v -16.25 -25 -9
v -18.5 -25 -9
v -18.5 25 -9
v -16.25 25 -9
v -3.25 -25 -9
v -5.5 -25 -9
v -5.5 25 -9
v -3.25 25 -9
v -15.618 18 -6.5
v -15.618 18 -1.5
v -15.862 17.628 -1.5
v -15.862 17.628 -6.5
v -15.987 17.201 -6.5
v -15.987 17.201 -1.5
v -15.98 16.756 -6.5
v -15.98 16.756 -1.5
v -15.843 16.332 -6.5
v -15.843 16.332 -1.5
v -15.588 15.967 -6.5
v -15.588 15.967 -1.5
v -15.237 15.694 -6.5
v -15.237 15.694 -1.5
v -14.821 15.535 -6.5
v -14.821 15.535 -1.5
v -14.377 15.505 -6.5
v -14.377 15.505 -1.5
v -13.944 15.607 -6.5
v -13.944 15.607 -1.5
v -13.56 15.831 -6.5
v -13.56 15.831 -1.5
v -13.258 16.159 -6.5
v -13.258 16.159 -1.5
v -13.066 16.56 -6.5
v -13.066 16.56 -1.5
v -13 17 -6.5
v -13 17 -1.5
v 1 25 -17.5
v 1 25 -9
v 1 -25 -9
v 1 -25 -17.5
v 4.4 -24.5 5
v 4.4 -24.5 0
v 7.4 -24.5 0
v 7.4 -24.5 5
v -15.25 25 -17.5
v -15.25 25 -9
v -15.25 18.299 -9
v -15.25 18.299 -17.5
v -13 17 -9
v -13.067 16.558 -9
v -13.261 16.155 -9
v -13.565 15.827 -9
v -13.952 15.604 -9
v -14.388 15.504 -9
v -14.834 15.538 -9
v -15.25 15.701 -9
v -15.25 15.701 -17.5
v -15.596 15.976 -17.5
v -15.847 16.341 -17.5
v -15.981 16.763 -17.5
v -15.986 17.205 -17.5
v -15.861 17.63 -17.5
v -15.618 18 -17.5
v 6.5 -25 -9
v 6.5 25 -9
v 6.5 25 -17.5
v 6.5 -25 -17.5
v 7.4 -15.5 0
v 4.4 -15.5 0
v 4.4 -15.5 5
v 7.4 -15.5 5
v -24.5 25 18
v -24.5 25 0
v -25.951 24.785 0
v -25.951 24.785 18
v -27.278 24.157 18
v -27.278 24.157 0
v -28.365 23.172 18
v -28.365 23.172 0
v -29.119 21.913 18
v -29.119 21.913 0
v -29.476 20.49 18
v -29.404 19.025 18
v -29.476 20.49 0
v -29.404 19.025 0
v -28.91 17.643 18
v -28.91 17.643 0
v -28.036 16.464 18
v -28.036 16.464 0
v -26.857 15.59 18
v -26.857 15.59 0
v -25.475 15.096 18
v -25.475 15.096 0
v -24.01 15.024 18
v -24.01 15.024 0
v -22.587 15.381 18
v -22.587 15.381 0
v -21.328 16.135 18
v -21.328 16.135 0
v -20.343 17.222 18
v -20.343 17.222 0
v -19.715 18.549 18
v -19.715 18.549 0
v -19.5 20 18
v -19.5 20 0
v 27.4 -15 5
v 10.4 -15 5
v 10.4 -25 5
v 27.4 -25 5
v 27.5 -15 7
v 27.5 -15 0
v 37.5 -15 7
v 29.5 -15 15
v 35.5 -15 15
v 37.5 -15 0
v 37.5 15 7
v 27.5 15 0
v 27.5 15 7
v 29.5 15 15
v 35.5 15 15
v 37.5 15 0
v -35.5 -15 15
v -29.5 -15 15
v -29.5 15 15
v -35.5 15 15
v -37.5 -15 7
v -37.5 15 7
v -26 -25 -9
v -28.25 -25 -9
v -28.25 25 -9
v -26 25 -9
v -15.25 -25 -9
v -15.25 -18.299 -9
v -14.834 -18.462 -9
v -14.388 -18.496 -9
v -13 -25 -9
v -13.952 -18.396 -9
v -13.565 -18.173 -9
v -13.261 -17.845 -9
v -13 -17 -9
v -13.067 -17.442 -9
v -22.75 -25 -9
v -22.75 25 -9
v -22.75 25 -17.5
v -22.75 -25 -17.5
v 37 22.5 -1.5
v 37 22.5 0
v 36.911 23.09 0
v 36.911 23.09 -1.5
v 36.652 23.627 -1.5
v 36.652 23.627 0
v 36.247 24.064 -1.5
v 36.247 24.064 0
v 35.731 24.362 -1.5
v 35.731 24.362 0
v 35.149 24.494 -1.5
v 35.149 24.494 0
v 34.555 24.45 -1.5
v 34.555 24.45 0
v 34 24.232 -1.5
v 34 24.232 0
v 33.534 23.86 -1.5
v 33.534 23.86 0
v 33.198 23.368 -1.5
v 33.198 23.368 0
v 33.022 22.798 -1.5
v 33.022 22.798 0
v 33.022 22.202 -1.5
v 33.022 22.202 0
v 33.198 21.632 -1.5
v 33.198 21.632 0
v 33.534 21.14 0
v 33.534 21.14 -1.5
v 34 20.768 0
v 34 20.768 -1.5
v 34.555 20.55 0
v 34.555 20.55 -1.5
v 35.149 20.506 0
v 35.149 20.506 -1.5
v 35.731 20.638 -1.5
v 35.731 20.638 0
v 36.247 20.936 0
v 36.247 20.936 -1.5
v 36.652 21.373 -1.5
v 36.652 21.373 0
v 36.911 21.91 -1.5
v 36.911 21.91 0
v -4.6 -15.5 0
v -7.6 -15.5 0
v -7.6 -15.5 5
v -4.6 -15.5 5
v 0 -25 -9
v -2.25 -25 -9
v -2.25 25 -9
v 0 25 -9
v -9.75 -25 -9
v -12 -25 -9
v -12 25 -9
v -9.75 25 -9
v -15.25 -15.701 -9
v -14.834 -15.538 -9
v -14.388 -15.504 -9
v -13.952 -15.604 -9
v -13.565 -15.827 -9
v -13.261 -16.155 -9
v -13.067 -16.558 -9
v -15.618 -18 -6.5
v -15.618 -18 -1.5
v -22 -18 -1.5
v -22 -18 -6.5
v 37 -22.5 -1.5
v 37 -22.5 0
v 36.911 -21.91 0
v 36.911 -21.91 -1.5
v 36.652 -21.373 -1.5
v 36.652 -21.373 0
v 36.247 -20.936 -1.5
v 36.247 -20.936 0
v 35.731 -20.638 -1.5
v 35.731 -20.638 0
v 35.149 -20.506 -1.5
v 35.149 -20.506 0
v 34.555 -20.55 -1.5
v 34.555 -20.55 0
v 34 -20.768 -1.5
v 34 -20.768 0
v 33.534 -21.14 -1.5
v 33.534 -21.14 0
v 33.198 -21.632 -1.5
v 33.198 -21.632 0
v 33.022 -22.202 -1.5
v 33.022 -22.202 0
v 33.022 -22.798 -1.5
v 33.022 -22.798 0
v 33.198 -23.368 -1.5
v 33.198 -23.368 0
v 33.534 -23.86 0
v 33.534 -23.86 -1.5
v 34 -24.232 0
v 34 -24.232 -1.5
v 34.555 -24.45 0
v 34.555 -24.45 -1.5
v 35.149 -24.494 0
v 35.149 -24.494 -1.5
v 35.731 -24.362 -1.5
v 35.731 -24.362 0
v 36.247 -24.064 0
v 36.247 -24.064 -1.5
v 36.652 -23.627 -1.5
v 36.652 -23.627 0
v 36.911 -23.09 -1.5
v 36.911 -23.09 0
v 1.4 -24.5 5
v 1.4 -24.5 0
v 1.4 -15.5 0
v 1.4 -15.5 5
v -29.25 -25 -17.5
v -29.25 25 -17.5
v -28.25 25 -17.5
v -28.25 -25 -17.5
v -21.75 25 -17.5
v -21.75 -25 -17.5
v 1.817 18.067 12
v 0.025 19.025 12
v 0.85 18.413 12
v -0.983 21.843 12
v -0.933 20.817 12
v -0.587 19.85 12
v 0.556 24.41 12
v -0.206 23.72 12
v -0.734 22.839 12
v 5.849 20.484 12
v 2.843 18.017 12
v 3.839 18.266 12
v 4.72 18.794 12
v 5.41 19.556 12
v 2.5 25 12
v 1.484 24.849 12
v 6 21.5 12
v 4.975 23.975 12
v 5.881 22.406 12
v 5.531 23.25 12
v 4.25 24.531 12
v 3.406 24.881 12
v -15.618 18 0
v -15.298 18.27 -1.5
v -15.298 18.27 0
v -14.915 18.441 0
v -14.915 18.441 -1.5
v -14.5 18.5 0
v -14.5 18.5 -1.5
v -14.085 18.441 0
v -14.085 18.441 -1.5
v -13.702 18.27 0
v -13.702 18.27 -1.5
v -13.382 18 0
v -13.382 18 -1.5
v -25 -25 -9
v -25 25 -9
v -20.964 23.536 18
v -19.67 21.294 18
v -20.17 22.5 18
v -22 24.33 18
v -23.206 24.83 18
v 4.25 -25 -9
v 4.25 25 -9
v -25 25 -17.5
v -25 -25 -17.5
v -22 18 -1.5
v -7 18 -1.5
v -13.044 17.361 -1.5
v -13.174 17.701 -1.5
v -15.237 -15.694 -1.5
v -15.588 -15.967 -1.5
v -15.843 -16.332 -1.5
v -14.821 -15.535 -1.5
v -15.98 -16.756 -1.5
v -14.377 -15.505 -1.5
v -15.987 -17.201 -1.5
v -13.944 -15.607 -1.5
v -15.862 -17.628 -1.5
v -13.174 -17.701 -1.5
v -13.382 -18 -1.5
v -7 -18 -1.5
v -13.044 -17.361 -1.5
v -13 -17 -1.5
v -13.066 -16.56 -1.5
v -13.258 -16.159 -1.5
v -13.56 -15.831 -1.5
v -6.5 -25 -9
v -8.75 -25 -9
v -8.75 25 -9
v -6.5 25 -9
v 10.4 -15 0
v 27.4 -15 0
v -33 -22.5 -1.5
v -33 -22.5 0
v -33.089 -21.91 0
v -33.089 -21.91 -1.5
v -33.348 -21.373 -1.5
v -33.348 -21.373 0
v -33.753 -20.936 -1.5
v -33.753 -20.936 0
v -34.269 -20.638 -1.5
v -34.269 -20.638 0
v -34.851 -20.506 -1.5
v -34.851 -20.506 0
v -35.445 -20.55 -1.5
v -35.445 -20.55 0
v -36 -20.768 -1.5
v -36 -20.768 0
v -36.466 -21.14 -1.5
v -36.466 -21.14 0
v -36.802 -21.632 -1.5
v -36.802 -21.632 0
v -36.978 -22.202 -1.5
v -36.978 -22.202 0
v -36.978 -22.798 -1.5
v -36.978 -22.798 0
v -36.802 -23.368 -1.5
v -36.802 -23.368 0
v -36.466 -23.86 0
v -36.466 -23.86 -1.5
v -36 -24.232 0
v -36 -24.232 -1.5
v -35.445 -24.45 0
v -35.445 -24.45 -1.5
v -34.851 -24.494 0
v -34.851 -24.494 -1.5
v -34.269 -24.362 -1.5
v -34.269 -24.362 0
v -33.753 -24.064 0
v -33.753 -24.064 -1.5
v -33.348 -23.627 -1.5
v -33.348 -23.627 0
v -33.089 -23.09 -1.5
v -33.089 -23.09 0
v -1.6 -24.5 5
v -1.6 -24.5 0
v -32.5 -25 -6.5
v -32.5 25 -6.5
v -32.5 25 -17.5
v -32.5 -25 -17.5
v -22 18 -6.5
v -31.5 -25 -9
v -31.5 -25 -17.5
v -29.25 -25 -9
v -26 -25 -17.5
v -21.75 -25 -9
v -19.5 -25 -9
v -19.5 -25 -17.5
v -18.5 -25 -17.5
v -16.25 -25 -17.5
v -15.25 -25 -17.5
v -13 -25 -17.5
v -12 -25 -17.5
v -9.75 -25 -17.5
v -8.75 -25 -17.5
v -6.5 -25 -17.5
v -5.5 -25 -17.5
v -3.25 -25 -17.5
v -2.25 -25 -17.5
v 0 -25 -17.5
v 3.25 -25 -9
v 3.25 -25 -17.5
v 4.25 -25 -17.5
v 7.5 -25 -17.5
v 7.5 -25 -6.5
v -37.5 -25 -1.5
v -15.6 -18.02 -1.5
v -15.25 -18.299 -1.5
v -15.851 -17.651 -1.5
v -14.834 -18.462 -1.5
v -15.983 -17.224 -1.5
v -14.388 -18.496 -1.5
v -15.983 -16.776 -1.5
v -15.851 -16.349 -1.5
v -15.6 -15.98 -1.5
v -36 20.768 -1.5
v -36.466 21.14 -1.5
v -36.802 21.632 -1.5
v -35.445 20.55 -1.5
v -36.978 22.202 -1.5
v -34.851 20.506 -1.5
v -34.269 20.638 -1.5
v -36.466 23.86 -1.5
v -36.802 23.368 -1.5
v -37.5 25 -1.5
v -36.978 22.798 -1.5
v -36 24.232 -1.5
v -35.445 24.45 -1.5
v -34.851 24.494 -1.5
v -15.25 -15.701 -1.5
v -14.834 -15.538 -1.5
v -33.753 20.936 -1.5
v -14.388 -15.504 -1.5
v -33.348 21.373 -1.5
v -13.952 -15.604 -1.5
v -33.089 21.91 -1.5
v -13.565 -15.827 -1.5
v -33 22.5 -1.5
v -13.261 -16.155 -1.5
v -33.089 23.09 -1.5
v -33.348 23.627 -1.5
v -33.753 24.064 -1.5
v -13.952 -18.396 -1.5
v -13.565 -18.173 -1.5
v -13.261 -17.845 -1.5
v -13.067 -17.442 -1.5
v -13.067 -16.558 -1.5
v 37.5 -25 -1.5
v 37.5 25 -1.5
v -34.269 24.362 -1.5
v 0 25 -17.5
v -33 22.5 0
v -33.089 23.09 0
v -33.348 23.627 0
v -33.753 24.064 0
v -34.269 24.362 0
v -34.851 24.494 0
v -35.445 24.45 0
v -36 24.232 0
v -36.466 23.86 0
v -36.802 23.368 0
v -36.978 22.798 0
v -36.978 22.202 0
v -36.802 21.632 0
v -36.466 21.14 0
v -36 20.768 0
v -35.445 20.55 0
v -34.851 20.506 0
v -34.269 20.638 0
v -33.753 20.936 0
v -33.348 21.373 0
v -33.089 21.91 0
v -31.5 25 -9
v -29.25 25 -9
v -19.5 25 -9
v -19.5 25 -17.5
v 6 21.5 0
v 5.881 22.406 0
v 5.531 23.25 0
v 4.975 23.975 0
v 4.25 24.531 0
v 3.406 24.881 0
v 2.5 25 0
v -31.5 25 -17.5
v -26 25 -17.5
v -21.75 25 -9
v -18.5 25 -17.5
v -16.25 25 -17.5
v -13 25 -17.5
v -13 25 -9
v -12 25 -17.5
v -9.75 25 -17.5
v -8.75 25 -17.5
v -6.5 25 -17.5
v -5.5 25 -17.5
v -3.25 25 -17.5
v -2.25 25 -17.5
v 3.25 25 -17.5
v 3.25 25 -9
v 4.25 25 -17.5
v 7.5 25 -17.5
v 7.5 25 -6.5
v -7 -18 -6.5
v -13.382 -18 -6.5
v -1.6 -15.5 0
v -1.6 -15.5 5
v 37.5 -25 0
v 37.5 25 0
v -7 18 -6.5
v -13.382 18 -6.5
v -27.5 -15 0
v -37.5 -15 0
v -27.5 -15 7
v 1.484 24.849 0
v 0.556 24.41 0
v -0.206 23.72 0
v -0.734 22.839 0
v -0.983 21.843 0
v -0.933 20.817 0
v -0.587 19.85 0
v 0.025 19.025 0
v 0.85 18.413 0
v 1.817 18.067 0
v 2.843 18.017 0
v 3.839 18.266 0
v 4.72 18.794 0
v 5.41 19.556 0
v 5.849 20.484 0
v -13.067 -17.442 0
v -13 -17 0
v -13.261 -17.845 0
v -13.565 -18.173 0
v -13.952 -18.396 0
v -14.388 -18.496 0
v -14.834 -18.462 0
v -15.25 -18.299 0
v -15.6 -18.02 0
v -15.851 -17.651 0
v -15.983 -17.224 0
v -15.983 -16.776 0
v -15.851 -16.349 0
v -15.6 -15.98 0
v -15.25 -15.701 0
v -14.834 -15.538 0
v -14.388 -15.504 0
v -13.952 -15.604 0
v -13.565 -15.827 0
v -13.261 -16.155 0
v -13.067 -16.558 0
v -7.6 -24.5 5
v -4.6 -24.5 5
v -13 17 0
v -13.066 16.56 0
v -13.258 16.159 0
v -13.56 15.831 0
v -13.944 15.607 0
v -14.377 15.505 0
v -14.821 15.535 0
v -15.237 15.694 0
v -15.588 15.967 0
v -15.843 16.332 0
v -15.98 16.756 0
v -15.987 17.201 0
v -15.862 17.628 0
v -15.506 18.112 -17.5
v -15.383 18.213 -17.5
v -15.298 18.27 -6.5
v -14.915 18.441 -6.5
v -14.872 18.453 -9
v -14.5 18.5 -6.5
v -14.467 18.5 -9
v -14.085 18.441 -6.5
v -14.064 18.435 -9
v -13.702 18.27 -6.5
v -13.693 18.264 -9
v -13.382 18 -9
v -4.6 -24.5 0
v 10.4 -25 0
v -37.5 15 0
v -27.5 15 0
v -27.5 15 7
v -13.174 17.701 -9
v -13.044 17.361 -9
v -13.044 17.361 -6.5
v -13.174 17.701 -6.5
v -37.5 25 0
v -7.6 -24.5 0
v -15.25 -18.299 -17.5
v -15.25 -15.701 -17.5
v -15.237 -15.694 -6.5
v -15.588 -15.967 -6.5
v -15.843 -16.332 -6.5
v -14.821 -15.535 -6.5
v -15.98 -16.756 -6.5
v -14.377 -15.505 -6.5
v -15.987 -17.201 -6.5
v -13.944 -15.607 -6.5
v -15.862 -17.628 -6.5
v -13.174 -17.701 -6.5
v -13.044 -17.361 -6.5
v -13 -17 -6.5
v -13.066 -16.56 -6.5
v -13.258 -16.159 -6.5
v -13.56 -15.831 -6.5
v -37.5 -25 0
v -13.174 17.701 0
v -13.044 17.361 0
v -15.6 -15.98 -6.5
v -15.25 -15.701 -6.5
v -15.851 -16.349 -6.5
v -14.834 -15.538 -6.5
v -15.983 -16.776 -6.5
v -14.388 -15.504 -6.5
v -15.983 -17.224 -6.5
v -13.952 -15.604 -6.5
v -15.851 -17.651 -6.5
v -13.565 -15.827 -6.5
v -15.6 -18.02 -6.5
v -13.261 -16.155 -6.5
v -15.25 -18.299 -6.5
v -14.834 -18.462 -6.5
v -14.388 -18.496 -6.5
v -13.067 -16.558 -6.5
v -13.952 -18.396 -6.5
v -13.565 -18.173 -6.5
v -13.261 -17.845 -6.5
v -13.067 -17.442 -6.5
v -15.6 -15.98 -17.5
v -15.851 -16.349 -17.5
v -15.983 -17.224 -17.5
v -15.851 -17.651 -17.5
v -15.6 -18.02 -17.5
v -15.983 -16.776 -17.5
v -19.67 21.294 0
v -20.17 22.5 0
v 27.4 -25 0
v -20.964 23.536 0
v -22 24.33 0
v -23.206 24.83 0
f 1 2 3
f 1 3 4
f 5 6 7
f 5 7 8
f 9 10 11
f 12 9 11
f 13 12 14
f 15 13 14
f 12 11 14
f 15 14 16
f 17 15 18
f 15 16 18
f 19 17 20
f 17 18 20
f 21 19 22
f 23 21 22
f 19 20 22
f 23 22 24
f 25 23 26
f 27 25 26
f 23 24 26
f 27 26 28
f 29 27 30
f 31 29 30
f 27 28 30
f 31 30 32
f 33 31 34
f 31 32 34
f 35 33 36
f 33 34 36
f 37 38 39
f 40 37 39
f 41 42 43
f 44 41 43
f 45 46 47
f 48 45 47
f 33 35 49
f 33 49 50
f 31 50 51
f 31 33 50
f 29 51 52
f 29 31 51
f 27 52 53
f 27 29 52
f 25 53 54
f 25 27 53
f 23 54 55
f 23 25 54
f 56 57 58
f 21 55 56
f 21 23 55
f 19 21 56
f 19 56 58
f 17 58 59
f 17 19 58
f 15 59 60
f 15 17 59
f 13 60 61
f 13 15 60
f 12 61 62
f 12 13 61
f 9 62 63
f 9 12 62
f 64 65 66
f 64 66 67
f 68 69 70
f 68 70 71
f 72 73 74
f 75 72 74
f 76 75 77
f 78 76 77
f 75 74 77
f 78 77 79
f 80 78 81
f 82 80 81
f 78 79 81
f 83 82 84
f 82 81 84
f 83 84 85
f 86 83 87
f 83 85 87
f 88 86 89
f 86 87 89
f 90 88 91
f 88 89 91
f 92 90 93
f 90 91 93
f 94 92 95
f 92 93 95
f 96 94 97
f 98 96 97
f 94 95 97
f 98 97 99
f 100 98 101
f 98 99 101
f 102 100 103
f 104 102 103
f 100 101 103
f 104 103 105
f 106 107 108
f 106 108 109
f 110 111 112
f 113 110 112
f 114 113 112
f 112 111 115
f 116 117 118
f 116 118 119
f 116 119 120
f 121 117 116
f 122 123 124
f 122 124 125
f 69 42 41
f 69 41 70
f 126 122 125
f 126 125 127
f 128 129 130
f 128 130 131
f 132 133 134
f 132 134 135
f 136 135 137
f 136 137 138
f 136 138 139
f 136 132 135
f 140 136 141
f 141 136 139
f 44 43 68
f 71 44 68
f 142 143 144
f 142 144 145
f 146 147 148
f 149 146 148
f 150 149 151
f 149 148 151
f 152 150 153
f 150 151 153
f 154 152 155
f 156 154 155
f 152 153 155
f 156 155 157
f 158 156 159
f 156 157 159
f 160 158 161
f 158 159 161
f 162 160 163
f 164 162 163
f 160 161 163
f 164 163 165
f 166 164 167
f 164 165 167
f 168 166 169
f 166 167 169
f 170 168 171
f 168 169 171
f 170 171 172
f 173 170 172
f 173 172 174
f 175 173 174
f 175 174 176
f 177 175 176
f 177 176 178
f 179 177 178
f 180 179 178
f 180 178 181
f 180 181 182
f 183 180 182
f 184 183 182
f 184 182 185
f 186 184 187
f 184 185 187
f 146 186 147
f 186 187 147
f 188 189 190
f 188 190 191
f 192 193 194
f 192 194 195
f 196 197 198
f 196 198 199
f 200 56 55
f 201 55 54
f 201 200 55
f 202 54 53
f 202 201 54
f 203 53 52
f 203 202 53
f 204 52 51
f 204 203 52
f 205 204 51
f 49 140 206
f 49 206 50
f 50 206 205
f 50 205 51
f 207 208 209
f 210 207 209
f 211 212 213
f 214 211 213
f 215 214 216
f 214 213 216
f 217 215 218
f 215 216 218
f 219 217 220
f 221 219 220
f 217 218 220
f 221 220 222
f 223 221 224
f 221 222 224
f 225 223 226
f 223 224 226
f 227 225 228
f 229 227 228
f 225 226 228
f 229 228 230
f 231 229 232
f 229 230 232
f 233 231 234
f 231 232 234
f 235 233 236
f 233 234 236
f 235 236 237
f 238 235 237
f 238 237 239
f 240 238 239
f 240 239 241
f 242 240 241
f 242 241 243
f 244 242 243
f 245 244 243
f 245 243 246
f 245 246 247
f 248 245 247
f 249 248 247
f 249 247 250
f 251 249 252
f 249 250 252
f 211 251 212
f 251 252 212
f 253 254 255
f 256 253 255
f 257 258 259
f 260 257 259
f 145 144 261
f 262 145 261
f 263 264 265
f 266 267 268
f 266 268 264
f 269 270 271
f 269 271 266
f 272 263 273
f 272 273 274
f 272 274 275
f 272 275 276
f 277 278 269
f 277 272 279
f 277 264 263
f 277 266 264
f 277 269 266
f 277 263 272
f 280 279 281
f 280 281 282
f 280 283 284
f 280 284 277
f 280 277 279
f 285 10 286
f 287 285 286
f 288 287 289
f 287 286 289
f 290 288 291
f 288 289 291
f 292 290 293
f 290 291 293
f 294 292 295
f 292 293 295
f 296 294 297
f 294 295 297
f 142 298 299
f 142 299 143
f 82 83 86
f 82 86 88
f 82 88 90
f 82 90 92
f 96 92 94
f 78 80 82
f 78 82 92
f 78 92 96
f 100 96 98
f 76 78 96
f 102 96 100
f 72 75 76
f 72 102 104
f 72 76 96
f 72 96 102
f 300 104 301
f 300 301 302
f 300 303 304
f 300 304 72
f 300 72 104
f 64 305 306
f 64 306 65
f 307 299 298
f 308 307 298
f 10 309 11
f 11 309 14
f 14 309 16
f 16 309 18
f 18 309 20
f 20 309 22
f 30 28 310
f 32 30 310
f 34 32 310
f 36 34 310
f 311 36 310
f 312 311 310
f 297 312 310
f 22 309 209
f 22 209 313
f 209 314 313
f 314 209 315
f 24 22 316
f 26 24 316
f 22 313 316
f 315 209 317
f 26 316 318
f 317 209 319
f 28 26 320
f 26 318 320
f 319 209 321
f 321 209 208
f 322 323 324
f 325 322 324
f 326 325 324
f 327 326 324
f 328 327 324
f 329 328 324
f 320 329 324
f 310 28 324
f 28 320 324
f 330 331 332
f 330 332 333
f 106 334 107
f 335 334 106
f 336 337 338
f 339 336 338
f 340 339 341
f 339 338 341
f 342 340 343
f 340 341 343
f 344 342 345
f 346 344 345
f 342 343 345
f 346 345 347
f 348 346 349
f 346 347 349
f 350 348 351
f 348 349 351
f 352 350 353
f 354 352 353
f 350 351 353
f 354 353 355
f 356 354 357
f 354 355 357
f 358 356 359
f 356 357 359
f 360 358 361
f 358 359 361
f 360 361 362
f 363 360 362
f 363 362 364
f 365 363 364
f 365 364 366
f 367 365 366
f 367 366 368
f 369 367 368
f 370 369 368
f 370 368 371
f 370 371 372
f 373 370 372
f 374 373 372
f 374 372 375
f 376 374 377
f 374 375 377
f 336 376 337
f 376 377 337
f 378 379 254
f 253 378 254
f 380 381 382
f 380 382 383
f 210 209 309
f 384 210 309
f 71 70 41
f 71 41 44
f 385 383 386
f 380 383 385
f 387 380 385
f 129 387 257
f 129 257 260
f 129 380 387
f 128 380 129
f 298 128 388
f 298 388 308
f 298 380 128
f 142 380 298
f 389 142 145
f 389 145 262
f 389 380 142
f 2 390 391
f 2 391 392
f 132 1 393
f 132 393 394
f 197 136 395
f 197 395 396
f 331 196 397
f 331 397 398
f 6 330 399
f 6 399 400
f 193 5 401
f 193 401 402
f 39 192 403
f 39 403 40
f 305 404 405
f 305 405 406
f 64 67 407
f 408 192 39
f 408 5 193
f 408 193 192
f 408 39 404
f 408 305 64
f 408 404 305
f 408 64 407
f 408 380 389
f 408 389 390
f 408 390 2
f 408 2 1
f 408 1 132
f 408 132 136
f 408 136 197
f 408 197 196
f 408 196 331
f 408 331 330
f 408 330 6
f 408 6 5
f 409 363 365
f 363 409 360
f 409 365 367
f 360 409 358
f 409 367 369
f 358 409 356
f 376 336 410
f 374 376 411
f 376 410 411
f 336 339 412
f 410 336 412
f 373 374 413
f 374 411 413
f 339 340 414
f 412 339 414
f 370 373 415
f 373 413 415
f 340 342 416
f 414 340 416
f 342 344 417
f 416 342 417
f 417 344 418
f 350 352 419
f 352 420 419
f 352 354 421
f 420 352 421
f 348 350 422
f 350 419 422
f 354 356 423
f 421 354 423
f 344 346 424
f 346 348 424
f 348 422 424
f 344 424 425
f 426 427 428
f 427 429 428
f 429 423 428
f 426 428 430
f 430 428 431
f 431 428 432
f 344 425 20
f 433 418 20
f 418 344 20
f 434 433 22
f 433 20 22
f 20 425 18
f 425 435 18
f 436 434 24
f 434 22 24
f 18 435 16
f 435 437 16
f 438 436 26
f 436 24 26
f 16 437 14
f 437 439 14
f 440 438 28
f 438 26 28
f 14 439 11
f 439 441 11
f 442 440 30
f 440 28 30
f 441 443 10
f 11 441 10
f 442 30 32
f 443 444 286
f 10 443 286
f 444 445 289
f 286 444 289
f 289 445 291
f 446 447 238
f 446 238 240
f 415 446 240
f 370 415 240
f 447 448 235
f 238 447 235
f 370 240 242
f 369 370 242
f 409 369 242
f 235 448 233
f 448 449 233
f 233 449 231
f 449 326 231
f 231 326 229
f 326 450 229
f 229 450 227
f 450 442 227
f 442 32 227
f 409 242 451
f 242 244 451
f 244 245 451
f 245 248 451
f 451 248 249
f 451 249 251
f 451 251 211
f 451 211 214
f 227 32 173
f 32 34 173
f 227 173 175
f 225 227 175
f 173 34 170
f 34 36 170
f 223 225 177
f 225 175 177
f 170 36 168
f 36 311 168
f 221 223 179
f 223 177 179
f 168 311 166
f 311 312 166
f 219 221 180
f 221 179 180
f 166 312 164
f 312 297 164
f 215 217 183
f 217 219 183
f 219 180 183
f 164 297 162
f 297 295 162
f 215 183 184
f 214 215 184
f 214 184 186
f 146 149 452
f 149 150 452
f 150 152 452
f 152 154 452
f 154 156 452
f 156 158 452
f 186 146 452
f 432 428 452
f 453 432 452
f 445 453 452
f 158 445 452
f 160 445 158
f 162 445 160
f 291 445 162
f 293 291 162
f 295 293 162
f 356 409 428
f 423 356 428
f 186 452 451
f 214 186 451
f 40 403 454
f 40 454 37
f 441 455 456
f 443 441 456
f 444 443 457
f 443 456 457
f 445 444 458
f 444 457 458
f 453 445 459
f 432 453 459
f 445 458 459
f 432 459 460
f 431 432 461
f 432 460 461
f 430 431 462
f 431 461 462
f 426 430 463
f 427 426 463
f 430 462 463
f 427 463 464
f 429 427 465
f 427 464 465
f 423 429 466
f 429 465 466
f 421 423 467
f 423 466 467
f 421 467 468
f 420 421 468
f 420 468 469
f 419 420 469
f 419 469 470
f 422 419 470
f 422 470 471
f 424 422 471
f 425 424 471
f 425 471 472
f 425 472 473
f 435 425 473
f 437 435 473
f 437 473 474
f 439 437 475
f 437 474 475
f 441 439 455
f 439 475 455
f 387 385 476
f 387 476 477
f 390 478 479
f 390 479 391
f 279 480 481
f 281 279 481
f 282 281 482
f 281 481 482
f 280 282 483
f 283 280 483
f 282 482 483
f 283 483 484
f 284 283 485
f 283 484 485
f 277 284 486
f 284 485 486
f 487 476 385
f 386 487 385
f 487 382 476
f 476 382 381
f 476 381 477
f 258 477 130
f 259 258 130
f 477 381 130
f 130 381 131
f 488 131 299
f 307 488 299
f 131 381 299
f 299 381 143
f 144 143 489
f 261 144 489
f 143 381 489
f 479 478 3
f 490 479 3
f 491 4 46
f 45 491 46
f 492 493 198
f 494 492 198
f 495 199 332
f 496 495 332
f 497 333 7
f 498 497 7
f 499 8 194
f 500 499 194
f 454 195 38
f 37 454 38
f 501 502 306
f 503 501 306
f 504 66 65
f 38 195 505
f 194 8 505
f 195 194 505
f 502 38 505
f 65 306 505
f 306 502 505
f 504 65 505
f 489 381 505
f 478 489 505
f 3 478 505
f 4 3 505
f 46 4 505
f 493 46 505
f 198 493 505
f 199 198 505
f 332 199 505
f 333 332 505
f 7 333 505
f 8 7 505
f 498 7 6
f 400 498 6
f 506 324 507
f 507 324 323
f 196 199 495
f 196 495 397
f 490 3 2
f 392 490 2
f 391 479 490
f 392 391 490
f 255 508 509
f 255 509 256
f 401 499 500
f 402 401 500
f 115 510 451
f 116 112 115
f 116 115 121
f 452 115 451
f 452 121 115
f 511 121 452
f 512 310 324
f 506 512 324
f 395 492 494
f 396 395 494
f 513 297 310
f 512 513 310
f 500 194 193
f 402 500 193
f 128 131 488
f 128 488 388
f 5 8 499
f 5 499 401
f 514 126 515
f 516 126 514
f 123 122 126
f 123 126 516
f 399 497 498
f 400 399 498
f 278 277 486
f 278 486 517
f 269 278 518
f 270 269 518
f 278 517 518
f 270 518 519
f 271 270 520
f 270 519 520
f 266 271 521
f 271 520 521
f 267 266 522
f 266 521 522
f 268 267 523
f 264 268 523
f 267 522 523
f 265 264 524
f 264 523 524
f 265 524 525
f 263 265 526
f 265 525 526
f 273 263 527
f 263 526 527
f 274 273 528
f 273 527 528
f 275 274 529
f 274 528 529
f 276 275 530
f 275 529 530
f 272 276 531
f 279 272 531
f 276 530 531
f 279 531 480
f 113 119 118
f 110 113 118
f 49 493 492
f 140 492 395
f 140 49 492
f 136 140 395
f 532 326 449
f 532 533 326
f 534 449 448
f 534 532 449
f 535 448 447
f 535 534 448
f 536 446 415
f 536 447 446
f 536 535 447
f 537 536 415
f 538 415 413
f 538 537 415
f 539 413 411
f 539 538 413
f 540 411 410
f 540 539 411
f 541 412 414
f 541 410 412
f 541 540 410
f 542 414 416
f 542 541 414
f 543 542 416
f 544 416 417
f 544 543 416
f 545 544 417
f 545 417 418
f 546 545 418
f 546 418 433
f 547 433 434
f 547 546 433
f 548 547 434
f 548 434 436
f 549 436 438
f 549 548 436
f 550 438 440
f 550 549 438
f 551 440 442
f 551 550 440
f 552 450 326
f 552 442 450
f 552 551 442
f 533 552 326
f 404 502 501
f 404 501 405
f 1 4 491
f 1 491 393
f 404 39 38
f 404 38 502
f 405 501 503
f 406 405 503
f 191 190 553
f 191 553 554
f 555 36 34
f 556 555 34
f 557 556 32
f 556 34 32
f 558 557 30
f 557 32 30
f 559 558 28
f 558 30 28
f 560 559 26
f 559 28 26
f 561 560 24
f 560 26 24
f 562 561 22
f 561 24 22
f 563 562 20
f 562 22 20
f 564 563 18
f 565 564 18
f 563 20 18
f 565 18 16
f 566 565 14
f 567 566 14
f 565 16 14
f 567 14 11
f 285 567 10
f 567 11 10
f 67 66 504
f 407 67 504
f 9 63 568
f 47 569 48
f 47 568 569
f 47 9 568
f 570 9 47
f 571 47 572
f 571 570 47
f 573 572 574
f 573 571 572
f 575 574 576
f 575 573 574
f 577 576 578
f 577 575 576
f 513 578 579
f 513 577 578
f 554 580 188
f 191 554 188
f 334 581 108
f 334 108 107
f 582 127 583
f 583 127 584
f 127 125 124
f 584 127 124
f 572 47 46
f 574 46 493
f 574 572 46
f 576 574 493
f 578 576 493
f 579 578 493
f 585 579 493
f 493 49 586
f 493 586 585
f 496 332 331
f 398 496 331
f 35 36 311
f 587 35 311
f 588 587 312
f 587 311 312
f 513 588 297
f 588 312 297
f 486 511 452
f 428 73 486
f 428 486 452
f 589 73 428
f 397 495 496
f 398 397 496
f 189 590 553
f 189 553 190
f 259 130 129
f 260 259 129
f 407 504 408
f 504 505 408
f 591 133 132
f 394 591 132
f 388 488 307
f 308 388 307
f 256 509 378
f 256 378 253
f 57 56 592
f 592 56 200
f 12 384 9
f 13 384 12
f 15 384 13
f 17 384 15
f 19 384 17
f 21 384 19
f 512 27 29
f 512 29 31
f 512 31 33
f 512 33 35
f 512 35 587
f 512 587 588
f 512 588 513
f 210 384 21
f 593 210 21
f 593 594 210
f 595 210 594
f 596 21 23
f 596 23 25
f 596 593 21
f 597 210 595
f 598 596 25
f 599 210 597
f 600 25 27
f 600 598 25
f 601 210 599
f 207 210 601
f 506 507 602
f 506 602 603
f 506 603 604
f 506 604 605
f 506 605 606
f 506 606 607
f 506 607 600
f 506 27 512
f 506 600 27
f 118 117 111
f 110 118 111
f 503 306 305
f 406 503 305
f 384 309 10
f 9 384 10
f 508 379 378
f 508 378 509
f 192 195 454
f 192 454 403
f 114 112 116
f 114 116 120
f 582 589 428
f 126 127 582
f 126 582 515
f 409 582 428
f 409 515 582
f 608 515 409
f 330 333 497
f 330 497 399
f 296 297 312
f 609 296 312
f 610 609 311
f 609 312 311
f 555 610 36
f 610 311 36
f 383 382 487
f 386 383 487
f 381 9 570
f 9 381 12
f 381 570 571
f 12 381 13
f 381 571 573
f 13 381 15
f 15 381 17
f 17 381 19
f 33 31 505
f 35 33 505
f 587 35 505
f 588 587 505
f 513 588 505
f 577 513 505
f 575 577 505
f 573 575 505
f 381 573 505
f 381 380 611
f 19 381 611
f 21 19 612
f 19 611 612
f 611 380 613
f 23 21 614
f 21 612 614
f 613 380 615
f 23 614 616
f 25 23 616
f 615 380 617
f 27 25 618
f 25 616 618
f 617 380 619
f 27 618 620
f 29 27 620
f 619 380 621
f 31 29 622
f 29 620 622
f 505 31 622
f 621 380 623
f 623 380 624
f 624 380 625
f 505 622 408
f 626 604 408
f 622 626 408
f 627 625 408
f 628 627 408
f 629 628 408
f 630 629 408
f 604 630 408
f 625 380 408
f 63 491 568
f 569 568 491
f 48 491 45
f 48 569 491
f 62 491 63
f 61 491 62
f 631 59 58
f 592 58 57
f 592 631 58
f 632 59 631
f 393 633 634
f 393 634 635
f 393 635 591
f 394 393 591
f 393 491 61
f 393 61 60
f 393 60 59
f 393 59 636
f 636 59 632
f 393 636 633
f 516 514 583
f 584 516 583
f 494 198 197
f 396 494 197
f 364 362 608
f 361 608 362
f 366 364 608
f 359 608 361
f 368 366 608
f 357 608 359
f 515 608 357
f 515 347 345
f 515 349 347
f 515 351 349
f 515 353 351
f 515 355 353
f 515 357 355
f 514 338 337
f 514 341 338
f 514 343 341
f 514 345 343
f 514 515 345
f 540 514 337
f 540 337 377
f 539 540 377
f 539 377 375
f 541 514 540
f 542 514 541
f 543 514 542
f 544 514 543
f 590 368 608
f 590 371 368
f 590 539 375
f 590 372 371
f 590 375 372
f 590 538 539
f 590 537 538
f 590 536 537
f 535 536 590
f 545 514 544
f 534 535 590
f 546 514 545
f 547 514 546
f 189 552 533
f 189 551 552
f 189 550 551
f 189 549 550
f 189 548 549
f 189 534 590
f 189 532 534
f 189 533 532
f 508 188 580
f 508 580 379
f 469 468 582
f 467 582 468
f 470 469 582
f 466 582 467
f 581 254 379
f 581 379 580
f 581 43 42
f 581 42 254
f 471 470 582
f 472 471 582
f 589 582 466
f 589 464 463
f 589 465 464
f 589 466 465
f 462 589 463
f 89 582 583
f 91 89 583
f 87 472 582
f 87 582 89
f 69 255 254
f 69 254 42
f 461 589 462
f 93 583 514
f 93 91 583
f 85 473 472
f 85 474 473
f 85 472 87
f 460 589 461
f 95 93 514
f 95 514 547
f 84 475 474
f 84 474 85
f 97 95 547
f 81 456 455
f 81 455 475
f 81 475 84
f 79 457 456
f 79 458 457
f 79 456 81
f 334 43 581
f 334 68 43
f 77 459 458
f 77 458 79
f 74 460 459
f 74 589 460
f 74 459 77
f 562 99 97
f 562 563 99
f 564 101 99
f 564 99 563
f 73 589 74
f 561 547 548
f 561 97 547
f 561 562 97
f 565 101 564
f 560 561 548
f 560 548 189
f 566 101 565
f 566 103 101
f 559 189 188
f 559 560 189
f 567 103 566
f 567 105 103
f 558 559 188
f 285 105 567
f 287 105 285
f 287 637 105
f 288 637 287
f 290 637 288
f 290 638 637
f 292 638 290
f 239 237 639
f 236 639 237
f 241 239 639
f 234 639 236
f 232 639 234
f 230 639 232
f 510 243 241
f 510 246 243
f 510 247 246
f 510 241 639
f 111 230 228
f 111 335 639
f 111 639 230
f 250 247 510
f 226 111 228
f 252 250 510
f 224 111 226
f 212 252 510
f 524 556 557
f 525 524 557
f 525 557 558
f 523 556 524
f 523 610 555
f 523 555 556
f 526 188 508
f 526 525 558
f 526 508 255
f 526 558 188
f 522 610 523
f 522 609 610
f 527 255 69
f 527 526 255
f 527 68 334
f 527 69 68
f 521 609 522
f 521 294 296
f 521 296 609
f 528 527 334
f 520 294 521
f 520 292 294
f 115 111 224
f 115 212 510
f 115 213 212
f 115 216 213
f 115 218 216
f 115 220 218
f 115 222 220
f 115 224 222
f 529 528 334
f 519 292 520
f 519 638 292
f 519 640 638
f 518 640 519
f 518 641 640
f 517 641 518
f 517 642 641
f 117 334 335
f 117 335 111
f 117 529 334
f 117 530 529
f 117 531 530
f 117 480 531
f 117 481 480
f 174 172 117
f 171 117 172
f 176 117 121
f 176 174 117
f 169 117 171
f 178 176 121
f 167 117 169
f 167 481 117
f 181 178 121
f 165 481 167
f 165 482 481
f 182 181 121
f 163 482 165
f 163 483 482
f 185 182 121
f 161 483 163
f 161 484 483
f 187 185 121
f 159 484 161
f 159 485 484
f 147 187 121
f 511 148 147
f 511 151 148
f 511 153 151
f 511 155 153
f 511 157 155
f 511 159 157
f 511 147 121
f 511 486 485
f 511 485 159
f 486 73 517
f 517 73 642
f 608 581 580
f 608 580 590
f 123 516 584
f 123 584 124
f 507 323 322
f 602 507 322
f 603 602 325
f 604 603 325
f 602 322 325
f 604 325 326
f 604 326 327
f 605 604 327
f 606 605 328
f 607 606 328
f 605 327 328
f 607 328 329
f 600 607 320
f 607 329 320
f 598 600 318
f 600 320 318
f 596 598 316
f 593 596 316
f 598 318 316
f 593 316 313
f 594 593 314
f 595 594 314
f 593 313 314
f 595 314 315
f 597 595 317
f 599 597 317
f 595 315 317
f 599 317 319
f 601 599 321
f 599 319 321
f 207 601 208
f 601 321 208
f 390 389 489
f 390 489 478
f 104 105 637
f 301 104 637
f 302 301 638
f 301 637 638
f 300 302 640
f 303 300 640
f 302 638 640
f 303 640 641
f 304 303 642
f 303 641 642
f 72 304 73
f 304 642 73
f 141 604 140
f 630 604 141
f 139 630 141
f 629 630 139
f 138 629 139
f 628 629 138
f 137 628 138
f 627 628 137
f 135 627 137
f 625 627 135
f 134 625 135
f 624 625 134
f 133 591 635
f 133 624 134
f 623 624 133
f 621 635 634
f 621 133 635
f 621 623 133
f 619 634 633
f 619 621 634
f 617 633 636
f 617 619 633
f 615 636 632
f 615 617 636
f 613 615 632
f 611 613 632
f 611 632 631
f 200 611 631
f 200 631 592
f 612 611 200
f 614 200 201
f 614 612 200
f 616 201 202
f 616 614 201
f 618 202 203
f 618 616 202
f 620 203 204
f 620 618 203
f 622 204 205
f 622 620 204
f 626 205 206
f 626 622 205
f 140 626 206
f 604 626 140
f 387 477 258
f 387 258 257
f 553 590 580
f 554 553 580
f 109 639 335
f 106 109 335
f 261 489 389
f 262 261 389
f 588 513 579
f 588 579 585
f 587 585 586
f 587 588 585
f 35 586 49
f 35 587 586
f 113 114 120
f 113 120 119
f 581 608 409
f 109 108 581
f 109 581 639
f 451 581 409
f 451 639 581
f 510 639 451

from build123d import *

# Parameters (mm, degrees)
F0_R      = 2
F0_W      = 3
F0_H      = 9
F0_W_2    = 10
F0_H_2    = 15
F0_W_3    = 17
F0_H_3    = 10
F1_DEPTH  = 1.5
F2_DEPTH  = 7
F3_DEPTH  = 5
F5_DEPTH  = 30
F6_DEPTH  = 18
F7_DEPTH  = 12
F9_DEPTH  = 5
F10_W     = 40
F10_H     = 50
F11_DEPTH = 2.5
F12_W     = 1
F12_H     = 50
F13_DEPTH = 8.5
F14_DEPTH = 50


with BuildPart() as f1:
    # F0 (on Top) → F1 (new body)
    with BuildSketch(Plane.XY):
        Polygon((27.4, -25), (37.5, -25), (37.5, -15), (27.5, -15), (27.5, 0), (27.5, 15), (37.5, 15), (37.5, 25), (2.500000039, 25), (-24.4999999811, 25), (-37.5, 25), (-37.5, 15), (-27.5, 15), (-27.5, 0), (-27.5, -15), (-37.5, -15), (-37.5, -25), (10.4, -25), (10.4, -15), (27.4, -15), align=None)
        with Locations((-35, -22.5)):
            Circle(F0_R, mode=Mode.SUBTRACT)
        with Locations((-6.1, -20)):
            Rectangle(F0_W, F0_H, mode=Mode.SUBTRACT)
        with Locations((-0.1, -20)):
            Rectangle(F0_W, F0_H, mode=Mode.SUBTRACT)
        with Locations((5.9, -20)):
            Rectangle(F0_W, F0_H, mode=Mode.SUBTRACT)
        with Locations((35, -22.5)):
            Circle(F0_R, mode=Mode.SUBTRACT)
        with Locations((-35, 22.5)):
            Circle(F0_R, mode=Mode.SUBTRACT)
        with BuildLine():
            ThreePointArc((-19.5, 20), (-28.0355339126, 16.4644661007), (-24.4999999811, 25))
            ThreePointArc((-24.4999999811, 25), (-20.9644660874, 23.5355338993), (-19.5, 20))
        make_face(mode=Mode.SUBTRACT)
        with BuildLine():
            ThreePointArc((6, 21.5), (0.025126252, 19.0251262796), (2.500000039, 25))
            ThreePointArc((2.500000039, 25), (4.974873748, 23.9748737204), (6, 21.5))
        make_face(mode=Mode.SUBTRACT)
        with Locations((35, 22.5)):
            Circle(F0_R, mode=Mode.SUBTRACT)
        with Locations((32.5, -7.5)):
            Rectangle(F0_W_2, F0_H_2)
        with Locations((32.5, 7.5)):
            Rectangle(F0_W_2, F0_H_2)
        with Locations((-32.5, -7.5)):
            Rectangle(F0_W_2, F0_H_2)
        with Locations((-32.5, 7.5)):
            Rectangle(F0_W_2, F0_H_2)
        with BuildLine():
            ThreePointArc((-19.5, 20), (-20.9644660874, 23.5355338993), (-24.4999999811, 25))
            ThreePointArc((-24.4999999811, 25), (-28.0355339126, 16.4644661007), (-19.5, 20))
        make_face()
        with BuildLine():
            ThreePointArc((6, 21.5), (4.974873748, 23.9748737204), (2.500000039, 25))
            ThreePointArc((2.500000039, 25), (0.025126252, 19.0251262796), (6, 21.5))
        make_face()
        with Locations((5.9, -20)):
            Rectangle(F0_W, F0_H)
        with Locations((-0.1, -20)):
            Rectangle(F0_W, F0_H)
        with Locations((-6.1, -20)):
            Rectangle(F0_W, F0_H)
        with Locations((18.9, -20)):
            Rectangle(F0_W_3, F0_H_3)
    extrude(amount=-F1_DEPTH)

    # F0 (on Top) → F2 (join)
    with BuildSketch(Plane.XY):
        with Locations((-32.5, 7.5)):
            Rectangle(F0_W_2, F0_H_2)
        with Locations((-32.5, -7.5)):
            Rectangle(F0_W_2, F0_H_2)
        with Locations((32.5, -7.5)):
            Rectangle(F0_W_2, F0_H_2)
        with Locations((32.5, 7.5)):
            Rectangle(F0_W_2, F0_H_2)
    extrude(amount=F2_DEPTH)

    # F0 (on Top) → F3 (join)
    with BuildSketch(Plane.XY):
        with Locations((-6.1, -20)):
            Rectangle(F0_W, F0_H)
        with Locations((-0.1, -20)):
            Rectangle(F0_W, F0_H)
        with Locations((5.9, -20)):
            Rectangle(F0_W, F0_H)
        with Locations((18.9, -20)):
            Rectangle(F0_W_3, F0_H_3)
    extrude(amount=F3_DEPTH)

    # F4 (on face) → F5 (join, through all)
    with BuildSketch(Plane.XZ.offset(15)):
        Polygon((-29.5, 15), (-35.5, 15), (-37.5, 7), (-27.5, 7), align=None)
        Polygon((37.5, 7), (35.5, 15), (29.5, 15), (27.5, 7), align=None)
    extrude(amount=-F5_DEPTH)

    # F0 (on Top) → F6 (join)
    with BuildSketch(Plane.XY):
        with BuildLine():
            ThreePointArc((-19.5, 20), (-20.9644660874, 23.5355338993), (-24.4999999811, 25))
            ThreePointArc((-24.4999999811, 25), (-28.0355339126, 16.4644661007), (-19.5, 20))
        make_face()
    extrude(amount=F6_DEPTH)

    # F0 (on Top) → F7 (join)
    with BuildSketch(Plane.XY):
        with BuildLine():
            ThreePointArc((6, 21.5), (4.974873748, 23.9748737204), (2.500000039, 25))
            ThreePointArc((2.500000039, 25), (0.025126252, 19.0251262796), (6, 21.5))
        make_face()
    extrude(amount=F7_DEPTH)


with BuildPart() as f9:
    # F8 (on face) → F9 (new body)
    with BuildSketch(Plane(origin=(0, 0, -1.5), x_dir=(1, 0, 0), z_dir=(0, 0, -1))):
        with BuildLine():
            Line((-7, -18), (-7, 18))
            Line((-7, 18), (-13.3819660113, 18))
            ThreePointArc((-13.3819660113, 18), (-13.0987414616, 17.5352331347), (-13, 17))
            ThreePointArc((-13, 17), (-15.0352331347, 15.5987414616), (-15.6180339887, 18))
            Line((-15.6180339887, 18), (-22, 18))
            Line((-22, 18), (-22, -18))
            Line((-22, -18), (-15.6180339887, -18))
            ThreePointArc((-15.6180339887, -18), (-15.0352331347, -15.5987414616), (-13, -17))
            ThreePointArc((-13, -17), (-13.0987414616, -17.5352331347), (-13.3819660113, -18))
            Line((-13.3819660113, -18), (-7, -18))
        make_face()
    extrude(amount=F9_DEPTH)


with BuildPart() as f11:
    # F10 (on face) → F11 (new body)
    with BuildSketch(Plane(origin=(0, 0, -6.5), x_dir=(1, 0, 0), z_dir=(0, 0, -1))):
        with Locations((-12.5, 0)):
            Rectangle(F10_W, F10_H)
        with BuildLine():
            Line((-7, -18), (-13.3819660113, -18))
            ThreePointArc((-13.3819660113, -18), (-13.0987414616, -17.5352331347), (-13, -17))
            ThreePointArc((-13, -17), (-15.0352331347, -15.5987414616), (-15.6180339887, -18))
            Line((-15.6180339887, -18), (-22, -18))
            Line((-22, -18), (-22, 18))
            Line((-22, 18), (-15.6180339887, 18))
            ThreePointArc((-15.6180339887, 18), (-14.5, 15.5), (-13.3819660113, 18))
            Line((-13.3819660113, 18), (-7, 18))
            Line((-7, 18), (-7, -18))
        make_face(mode=Mode.SUBTRACT)
        with BuildLine():
            ThreePointArc((-13, -17), (-13.0987414616, -17.5352331347), (-13.3819660113, -18))
            Line((-13.3819660113, -18), (-7, -18))
            Line((-7, -18), (-7, 18))
            Line((-7, 18), (-13.3819660113, 18))
            ThreePointArc((-13.3819660113, 18), (-14.5, 15.5), (-15.6180339887, 18))
            Line((-15.6180339887, 18), (-22, 18))
            Line((-22, 18), (-22, -18))
            Line((-22, -18), (-15.6180339887, -18))
            ThreePointArc((-15.6180339887, -18), (-15.0352331347, -15.5987414616), (-13, -17))
        make_face()
    extrude(amount=F11_DEPTH)

    # F12 (on face) → F13 (join)
    with BuildSketch(Plane(origin=(0, 0, -9), x_dir=(1, 0, 0), z_dir=(0, 0, -1))):
        with Locations((7, 0)):
            Rectangle(F12_W, F12_H)
        with Locations((3.75, 0)):
            Rectangle(F12_W, F12_H)
        with Locations((0.5, 0)):
            Rectangle(F12_W, F12_H)
        with Locations((-2.75, 0)):
            Rectangle(F12_W, F12_H)
        with Locations((-6, 0)):
            Rectangle(F12_W, F12_H)
        with Locations((-9.25, 0)):
            Rectangle(F12_W, F12_H)
        with Locations((-12.5, 0)):
            Rectangle(F12_W, F12_H)
        with Locations((-15.75, 0)):
            Rectangle(F12_W, F12_H)
        with Locations((-19, 0)):
            Rectangle(F12_W, F12_H)
        with Locations((-22.25, 0)):
            Rectangle(F12_W, F12_H)
        with Locations((-25.5, 0)):
            Rectangle(F12_W, F12_H)
        with Locations((-28.75, 0)):
            Rectangle(F12_W, F12_H)
        with Locations((-32, 0)):
            Rectangle(F12_W, F12_H)
    extrude(amount=F13_DEPTH)


with BuildPart() as f14_tool:
    # F8 (on face) → F14 (new body, symmetric)
    with BuildSketch(Plane(origin=(0, 0, -1.5), x_dir=(1, 0, 0), z_dir=(0, 0, -1))):
        with BuildLine():
            ThreePointArc((-13, 17), (-13.0987414616, 17.5352331347), (-13.3819660113, 18))
            Line((-13.3819660113, 18), (-15.6180339887, 18))
            ThreePointArc((-15.6180339887, 18), (-15.0352331347, 15.5987414616), (-13, 17))
        make_face()
        with BuildLine():
            Line((-15.6180339887, 18), (-13.3819660113, 18))
            ThreePointArc((-13.3819660113, 18), (-14.5, 18.5), (-15.6180339887, 18))
        make_face()
        with BuildLine():
            Line((-15.6180339887, -18), (-13.3819660113, -18))
            ThreePointArc((-13.3819660113, -18), (-13.0987414616, -17.5352331347), (-13, -17))
            ThreePointArc((-13, -17), (-15.0352331347, -15.5987414616), (-15.6180339887, -18))
        make_face()
        with BuildLine():
            ThreePointArc((-15.6180339887, -18), (-14.5, -18.5), (-13.3819660113, -18))
            Line((-13.3819660113, -18), (-15.6180339887, -18))
        make_face()
    extrude(amount=F14_DEPTH, both=True)


with BuildPart() as f1_1:
    add(f1.part)

    # F14: cut by f14_tool
    add(f14_tool.part, mode=Mode.SUBTRACT)


with BuildPart() as f11_1:
    add(f11.part)

    # F14: cut by f14_tool
    add(f14_tool.part, mode=Mode.SUBTRACT)


solid = Compound([f9.part, f1_1.part, f11_1.part])
